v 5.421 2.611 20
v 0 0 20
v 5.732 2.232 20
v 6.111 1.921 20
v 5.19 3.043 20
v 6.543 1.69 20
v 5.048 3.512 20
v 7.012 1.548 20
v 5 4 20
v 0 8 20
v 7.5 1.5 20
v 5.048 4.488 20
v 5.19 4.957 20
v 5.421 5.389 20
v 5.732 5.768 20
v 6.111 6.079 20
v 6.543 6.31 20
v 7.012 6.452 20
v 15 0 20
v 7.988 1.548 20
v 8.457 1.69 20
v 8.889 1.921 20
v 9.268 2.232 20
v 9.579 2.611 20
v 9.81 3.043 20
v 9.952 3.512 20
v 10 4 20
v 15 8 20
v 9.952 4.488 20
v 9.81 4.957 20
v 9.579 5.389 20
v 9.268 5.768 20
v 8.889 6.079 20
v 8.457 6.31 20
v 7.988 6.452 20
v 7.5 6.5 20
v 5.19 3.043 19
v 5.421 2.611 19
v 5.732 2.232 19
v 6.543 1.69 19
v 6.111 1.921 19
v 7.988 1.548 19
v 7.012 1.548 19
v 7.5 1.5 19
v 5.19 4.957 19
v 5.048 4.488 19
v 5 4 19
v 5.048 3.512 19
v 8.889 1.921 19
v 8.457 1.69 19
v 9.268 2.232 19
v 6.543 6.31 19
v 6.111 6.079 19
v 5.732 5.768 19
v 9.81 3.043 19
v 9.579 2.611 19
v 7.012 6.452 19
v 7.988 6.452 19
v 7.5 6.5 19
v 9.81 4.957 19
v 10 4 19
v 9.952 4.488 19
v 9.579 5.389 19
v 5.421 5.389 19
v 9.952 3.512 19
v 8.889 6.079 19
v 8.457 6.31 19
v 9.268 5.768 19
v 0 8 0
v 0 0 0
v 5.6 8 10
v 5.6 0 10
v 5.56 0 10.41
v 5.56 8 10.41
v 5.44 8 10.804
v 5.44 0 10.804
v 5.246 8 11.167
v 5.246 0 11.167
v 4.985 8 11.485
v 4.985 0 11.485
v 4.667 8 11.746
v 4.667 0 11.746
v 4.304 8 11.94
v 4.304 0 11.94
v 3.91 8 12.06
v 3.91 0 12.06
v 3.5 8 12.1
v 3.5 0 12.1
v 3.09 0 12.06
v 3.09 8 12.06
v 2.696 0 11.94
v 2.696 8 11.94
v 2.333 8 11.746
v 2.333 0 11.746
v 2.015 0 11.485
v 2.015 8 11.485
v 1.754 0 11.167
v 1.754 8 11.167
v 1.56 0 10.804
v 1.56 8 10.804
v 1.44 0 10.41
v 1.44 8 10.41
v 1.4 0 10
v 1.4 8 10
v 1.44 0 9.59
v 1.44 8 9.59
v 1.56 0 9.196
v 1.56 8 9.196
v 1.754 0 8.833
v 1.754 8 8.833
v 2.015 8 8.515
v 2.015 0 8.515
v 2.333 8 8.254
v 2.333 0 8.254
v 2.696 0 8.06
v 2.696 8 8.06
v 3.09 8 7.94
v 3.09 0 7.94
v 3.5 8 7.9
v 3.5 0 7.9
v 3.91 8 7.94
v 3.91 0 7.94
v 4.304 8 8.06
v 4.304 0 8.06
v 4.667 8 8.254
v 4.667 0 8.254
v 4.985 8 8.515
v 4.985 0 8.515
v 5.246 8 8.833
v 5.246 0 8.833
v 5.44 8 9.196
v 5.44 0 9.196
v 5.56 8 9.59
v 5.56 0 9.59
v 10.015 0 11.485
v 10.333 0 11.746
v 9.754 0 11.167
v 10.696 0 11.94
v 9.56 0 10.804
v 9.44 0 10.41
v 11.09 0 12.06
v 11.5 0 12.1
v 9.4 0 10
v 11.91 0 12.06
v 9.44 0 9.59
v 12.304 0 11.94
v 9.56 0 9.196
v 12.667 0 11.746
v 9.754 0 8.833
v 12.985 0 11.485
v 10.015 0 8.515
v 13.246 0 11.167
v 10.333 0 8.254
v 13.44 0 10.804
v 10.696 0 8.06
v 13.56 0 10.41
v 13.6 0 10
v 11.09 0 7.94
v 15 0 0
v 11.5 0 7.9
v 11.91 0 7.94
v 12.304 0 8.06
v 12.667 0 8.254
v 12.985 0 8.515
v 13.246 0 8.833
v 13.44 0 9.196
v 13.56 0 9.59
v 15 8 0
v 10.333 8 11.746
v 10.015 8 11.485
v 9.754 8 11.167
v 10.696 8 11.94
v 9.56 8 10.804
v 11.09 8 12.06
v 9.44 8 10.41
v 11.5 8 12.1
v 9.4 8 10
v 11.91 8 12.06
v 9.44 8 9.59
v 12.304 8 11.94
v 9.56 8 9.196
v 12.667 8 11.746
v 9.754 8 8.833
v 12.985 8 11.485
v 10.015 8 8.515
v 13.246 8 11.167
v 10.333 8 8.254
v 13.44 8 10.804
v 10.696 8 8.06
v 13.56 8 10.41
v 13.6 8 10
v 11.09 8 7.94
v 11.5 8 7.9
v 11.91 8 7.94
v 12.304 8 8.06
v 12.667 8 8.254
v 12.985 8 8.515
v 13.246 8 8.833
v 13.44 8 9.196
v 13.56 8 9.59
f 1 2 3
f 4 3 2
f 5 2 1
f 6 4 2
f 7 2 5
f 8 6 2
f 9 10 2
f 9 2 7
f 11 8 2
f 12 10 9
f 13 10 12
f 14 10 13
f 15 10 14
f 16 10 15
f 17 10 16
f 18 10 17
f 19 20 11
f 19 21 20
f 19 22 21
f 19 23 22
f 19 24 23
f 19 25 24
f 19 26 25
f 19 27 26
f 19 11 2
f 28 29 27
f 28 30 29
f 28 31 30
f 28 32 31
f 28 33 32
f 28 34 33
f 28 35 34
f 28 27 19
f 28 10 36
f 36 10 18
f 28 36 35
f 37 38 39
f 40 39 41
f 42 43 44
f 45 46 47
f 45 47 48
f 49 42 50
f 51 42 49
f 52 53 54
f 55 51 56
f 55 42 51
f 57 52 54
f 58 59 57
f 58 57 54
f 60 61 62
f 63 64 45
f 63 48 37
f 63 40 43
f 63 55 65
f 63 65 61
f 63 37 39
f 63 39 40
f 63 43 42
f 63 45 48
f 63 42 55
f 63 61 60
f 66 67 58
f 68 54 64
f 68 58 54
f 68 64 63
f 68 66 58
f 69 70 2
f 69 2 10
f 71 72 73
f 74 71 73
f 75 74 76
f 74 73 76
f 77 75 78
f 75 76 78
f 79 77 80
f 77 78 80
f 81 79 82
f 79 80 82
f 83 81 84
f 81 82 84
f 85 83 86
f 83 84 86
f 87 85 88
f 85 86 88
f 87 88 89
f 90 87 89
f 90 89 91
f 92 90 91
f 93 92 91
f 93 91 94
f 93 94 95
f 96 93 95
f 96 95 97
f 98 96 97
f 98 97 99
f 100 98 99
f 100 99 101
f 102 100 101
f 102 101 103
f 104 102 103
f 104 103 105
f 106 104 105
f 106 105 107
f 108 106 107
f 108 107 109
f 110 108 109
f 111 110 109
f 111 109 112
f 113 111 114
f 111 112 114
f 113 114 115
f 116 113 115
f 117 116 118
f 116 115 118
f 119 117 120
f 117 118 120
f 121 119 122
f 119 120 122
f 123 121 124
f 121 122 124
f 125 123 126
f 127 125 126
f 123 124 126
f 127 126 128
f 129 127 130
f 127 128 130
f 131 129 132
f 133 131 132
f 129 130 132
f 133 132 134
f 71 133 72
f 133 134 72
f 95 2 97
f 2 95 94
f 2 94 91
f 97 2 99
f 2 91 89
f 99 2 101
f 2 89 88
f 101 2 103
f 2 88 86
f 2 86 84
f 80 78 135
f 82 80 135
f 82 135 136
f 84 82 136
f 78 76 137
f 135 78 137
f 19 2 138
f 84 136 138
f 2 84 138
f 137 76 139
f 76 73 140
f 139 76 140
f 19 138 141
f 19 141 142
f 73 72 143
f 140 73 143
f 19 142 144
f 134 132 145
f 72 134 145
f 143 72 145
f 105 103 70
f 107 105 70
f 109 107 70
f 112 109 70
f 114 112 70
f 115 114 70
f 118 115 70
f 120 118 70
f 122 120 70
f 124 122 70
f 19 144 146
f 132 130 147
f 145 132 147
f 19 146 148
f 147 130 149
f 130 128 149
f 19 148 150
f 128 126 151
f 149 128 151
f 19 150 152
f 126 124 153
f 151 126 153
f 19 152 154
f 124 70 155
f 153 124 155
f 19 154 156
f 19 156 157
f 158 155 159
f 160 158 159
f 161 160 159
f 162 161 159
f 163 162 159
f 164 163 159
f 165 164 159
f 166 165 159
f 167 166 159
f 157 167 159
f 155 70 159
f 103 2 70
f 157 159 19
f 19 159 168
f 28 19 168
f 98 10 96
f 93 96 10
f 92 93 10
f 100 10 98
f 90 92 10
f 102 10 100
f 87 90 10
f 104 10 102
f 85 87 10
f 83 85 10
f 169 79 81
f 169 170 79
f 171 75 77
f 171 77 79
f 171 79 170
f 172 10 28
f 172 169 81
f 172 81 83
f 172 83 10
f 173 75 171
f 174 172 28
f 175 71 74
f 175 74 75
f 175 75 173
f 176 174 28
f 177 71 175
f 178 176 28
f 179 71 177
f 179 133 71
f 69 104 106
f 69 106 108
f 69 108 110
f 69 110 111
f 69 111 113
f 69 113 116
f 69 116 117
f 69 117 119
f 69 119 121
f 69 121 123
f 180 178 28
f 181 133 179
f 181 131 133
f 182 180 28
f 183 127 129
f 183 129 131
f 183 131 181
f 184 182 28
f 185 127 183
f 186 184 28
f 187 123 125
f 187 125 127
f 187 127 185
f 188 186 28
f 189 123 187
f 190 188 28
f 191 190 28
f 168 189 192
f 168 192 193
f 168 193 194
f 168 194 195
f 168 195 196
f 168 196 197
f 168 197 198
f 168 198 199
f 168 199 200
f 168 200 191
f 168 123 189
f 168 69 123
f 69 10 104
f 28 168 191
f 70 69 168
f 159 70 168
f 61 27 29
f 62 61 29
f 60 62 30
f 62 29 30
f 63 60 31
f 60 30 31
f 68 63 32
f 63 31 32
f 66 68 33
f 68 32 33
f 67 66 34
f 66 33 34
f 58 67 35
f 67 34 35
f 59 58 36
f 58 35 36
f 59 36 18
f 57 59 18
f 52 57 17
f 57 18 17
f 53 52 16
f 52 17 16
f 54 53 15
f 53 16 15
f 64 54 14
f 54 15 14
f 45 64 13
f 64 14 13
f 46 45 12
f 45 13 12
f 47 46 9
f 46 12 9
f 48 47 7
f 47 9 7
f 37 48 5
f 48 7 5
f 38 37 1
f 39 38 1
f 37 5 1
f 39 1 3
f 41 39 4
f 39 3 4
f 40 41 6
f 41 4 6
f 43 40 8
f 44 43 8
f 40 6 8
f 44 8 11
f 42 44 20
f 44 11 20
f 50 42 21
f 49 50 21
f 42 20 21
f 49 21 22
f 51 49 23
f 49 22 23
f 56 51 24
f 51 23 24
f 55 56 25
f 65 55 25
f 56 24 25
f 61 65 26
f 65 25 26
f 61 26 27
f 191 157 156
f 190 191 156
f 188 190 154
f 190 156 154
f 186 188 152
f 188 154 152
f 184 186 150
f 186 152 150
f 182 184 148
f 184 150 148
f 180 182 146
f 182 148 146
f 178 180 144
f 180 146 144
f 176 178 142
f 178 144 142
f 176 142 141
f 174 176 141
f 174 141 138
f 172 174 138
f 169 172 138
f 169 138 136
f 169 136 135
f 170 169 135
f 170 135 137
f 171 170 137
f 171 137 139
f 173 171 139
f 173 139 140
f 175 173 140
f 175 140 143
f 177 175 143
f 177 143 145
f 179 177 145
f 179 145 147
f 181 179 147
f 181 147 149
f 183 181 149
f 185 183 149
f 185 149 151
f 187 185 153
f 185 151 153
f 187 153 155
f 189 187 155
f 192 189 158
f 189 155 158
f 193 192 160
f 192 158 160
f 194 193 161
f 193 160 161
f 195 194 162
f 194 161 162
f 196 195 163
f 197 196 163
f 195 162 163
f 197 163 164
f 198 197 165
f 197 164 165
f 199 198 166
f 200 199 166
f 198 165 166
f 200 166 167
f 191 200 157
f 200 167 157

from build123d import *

# Parameters (mm, degrees)
F0_W     = 15
F0_H     = 8
F1_DEPTH = 20
F2_R     = 2.1
F3_DEPTH = 25
F4_R     = 2.5
F5_DEPTH = 1


with BuildPart() as f1:
    # F0 (on Top) → F1 (new body)
    with BuildSketch(Plane.XY):
        with Locations((7.5, 4)):
            Rectangle(F0_W, F0_H)
    extrude(amount=F1_DEPTH)

    # F2 (on face) → F3 (cut)
    with BuildSketch(Plane.XZ):
        with Locations((3.5, 10)):
            Circle(F2_R)
        with Locations((11.5, 10)):
            Circle(F2_R)
    extrude(amount=-F3_DEPTH, mode=Mode.SUBTRACT)

    # F4 (on face) → F5 (cut)
    with BuildSketch(Plane.XY.offset(20)):
        with Locations((7.5, 4)):
            Circle(F4_R)
    extrude(amount=-F5_DEPTH, mode=Mode.SUBTRACT)


solid = f1.part
